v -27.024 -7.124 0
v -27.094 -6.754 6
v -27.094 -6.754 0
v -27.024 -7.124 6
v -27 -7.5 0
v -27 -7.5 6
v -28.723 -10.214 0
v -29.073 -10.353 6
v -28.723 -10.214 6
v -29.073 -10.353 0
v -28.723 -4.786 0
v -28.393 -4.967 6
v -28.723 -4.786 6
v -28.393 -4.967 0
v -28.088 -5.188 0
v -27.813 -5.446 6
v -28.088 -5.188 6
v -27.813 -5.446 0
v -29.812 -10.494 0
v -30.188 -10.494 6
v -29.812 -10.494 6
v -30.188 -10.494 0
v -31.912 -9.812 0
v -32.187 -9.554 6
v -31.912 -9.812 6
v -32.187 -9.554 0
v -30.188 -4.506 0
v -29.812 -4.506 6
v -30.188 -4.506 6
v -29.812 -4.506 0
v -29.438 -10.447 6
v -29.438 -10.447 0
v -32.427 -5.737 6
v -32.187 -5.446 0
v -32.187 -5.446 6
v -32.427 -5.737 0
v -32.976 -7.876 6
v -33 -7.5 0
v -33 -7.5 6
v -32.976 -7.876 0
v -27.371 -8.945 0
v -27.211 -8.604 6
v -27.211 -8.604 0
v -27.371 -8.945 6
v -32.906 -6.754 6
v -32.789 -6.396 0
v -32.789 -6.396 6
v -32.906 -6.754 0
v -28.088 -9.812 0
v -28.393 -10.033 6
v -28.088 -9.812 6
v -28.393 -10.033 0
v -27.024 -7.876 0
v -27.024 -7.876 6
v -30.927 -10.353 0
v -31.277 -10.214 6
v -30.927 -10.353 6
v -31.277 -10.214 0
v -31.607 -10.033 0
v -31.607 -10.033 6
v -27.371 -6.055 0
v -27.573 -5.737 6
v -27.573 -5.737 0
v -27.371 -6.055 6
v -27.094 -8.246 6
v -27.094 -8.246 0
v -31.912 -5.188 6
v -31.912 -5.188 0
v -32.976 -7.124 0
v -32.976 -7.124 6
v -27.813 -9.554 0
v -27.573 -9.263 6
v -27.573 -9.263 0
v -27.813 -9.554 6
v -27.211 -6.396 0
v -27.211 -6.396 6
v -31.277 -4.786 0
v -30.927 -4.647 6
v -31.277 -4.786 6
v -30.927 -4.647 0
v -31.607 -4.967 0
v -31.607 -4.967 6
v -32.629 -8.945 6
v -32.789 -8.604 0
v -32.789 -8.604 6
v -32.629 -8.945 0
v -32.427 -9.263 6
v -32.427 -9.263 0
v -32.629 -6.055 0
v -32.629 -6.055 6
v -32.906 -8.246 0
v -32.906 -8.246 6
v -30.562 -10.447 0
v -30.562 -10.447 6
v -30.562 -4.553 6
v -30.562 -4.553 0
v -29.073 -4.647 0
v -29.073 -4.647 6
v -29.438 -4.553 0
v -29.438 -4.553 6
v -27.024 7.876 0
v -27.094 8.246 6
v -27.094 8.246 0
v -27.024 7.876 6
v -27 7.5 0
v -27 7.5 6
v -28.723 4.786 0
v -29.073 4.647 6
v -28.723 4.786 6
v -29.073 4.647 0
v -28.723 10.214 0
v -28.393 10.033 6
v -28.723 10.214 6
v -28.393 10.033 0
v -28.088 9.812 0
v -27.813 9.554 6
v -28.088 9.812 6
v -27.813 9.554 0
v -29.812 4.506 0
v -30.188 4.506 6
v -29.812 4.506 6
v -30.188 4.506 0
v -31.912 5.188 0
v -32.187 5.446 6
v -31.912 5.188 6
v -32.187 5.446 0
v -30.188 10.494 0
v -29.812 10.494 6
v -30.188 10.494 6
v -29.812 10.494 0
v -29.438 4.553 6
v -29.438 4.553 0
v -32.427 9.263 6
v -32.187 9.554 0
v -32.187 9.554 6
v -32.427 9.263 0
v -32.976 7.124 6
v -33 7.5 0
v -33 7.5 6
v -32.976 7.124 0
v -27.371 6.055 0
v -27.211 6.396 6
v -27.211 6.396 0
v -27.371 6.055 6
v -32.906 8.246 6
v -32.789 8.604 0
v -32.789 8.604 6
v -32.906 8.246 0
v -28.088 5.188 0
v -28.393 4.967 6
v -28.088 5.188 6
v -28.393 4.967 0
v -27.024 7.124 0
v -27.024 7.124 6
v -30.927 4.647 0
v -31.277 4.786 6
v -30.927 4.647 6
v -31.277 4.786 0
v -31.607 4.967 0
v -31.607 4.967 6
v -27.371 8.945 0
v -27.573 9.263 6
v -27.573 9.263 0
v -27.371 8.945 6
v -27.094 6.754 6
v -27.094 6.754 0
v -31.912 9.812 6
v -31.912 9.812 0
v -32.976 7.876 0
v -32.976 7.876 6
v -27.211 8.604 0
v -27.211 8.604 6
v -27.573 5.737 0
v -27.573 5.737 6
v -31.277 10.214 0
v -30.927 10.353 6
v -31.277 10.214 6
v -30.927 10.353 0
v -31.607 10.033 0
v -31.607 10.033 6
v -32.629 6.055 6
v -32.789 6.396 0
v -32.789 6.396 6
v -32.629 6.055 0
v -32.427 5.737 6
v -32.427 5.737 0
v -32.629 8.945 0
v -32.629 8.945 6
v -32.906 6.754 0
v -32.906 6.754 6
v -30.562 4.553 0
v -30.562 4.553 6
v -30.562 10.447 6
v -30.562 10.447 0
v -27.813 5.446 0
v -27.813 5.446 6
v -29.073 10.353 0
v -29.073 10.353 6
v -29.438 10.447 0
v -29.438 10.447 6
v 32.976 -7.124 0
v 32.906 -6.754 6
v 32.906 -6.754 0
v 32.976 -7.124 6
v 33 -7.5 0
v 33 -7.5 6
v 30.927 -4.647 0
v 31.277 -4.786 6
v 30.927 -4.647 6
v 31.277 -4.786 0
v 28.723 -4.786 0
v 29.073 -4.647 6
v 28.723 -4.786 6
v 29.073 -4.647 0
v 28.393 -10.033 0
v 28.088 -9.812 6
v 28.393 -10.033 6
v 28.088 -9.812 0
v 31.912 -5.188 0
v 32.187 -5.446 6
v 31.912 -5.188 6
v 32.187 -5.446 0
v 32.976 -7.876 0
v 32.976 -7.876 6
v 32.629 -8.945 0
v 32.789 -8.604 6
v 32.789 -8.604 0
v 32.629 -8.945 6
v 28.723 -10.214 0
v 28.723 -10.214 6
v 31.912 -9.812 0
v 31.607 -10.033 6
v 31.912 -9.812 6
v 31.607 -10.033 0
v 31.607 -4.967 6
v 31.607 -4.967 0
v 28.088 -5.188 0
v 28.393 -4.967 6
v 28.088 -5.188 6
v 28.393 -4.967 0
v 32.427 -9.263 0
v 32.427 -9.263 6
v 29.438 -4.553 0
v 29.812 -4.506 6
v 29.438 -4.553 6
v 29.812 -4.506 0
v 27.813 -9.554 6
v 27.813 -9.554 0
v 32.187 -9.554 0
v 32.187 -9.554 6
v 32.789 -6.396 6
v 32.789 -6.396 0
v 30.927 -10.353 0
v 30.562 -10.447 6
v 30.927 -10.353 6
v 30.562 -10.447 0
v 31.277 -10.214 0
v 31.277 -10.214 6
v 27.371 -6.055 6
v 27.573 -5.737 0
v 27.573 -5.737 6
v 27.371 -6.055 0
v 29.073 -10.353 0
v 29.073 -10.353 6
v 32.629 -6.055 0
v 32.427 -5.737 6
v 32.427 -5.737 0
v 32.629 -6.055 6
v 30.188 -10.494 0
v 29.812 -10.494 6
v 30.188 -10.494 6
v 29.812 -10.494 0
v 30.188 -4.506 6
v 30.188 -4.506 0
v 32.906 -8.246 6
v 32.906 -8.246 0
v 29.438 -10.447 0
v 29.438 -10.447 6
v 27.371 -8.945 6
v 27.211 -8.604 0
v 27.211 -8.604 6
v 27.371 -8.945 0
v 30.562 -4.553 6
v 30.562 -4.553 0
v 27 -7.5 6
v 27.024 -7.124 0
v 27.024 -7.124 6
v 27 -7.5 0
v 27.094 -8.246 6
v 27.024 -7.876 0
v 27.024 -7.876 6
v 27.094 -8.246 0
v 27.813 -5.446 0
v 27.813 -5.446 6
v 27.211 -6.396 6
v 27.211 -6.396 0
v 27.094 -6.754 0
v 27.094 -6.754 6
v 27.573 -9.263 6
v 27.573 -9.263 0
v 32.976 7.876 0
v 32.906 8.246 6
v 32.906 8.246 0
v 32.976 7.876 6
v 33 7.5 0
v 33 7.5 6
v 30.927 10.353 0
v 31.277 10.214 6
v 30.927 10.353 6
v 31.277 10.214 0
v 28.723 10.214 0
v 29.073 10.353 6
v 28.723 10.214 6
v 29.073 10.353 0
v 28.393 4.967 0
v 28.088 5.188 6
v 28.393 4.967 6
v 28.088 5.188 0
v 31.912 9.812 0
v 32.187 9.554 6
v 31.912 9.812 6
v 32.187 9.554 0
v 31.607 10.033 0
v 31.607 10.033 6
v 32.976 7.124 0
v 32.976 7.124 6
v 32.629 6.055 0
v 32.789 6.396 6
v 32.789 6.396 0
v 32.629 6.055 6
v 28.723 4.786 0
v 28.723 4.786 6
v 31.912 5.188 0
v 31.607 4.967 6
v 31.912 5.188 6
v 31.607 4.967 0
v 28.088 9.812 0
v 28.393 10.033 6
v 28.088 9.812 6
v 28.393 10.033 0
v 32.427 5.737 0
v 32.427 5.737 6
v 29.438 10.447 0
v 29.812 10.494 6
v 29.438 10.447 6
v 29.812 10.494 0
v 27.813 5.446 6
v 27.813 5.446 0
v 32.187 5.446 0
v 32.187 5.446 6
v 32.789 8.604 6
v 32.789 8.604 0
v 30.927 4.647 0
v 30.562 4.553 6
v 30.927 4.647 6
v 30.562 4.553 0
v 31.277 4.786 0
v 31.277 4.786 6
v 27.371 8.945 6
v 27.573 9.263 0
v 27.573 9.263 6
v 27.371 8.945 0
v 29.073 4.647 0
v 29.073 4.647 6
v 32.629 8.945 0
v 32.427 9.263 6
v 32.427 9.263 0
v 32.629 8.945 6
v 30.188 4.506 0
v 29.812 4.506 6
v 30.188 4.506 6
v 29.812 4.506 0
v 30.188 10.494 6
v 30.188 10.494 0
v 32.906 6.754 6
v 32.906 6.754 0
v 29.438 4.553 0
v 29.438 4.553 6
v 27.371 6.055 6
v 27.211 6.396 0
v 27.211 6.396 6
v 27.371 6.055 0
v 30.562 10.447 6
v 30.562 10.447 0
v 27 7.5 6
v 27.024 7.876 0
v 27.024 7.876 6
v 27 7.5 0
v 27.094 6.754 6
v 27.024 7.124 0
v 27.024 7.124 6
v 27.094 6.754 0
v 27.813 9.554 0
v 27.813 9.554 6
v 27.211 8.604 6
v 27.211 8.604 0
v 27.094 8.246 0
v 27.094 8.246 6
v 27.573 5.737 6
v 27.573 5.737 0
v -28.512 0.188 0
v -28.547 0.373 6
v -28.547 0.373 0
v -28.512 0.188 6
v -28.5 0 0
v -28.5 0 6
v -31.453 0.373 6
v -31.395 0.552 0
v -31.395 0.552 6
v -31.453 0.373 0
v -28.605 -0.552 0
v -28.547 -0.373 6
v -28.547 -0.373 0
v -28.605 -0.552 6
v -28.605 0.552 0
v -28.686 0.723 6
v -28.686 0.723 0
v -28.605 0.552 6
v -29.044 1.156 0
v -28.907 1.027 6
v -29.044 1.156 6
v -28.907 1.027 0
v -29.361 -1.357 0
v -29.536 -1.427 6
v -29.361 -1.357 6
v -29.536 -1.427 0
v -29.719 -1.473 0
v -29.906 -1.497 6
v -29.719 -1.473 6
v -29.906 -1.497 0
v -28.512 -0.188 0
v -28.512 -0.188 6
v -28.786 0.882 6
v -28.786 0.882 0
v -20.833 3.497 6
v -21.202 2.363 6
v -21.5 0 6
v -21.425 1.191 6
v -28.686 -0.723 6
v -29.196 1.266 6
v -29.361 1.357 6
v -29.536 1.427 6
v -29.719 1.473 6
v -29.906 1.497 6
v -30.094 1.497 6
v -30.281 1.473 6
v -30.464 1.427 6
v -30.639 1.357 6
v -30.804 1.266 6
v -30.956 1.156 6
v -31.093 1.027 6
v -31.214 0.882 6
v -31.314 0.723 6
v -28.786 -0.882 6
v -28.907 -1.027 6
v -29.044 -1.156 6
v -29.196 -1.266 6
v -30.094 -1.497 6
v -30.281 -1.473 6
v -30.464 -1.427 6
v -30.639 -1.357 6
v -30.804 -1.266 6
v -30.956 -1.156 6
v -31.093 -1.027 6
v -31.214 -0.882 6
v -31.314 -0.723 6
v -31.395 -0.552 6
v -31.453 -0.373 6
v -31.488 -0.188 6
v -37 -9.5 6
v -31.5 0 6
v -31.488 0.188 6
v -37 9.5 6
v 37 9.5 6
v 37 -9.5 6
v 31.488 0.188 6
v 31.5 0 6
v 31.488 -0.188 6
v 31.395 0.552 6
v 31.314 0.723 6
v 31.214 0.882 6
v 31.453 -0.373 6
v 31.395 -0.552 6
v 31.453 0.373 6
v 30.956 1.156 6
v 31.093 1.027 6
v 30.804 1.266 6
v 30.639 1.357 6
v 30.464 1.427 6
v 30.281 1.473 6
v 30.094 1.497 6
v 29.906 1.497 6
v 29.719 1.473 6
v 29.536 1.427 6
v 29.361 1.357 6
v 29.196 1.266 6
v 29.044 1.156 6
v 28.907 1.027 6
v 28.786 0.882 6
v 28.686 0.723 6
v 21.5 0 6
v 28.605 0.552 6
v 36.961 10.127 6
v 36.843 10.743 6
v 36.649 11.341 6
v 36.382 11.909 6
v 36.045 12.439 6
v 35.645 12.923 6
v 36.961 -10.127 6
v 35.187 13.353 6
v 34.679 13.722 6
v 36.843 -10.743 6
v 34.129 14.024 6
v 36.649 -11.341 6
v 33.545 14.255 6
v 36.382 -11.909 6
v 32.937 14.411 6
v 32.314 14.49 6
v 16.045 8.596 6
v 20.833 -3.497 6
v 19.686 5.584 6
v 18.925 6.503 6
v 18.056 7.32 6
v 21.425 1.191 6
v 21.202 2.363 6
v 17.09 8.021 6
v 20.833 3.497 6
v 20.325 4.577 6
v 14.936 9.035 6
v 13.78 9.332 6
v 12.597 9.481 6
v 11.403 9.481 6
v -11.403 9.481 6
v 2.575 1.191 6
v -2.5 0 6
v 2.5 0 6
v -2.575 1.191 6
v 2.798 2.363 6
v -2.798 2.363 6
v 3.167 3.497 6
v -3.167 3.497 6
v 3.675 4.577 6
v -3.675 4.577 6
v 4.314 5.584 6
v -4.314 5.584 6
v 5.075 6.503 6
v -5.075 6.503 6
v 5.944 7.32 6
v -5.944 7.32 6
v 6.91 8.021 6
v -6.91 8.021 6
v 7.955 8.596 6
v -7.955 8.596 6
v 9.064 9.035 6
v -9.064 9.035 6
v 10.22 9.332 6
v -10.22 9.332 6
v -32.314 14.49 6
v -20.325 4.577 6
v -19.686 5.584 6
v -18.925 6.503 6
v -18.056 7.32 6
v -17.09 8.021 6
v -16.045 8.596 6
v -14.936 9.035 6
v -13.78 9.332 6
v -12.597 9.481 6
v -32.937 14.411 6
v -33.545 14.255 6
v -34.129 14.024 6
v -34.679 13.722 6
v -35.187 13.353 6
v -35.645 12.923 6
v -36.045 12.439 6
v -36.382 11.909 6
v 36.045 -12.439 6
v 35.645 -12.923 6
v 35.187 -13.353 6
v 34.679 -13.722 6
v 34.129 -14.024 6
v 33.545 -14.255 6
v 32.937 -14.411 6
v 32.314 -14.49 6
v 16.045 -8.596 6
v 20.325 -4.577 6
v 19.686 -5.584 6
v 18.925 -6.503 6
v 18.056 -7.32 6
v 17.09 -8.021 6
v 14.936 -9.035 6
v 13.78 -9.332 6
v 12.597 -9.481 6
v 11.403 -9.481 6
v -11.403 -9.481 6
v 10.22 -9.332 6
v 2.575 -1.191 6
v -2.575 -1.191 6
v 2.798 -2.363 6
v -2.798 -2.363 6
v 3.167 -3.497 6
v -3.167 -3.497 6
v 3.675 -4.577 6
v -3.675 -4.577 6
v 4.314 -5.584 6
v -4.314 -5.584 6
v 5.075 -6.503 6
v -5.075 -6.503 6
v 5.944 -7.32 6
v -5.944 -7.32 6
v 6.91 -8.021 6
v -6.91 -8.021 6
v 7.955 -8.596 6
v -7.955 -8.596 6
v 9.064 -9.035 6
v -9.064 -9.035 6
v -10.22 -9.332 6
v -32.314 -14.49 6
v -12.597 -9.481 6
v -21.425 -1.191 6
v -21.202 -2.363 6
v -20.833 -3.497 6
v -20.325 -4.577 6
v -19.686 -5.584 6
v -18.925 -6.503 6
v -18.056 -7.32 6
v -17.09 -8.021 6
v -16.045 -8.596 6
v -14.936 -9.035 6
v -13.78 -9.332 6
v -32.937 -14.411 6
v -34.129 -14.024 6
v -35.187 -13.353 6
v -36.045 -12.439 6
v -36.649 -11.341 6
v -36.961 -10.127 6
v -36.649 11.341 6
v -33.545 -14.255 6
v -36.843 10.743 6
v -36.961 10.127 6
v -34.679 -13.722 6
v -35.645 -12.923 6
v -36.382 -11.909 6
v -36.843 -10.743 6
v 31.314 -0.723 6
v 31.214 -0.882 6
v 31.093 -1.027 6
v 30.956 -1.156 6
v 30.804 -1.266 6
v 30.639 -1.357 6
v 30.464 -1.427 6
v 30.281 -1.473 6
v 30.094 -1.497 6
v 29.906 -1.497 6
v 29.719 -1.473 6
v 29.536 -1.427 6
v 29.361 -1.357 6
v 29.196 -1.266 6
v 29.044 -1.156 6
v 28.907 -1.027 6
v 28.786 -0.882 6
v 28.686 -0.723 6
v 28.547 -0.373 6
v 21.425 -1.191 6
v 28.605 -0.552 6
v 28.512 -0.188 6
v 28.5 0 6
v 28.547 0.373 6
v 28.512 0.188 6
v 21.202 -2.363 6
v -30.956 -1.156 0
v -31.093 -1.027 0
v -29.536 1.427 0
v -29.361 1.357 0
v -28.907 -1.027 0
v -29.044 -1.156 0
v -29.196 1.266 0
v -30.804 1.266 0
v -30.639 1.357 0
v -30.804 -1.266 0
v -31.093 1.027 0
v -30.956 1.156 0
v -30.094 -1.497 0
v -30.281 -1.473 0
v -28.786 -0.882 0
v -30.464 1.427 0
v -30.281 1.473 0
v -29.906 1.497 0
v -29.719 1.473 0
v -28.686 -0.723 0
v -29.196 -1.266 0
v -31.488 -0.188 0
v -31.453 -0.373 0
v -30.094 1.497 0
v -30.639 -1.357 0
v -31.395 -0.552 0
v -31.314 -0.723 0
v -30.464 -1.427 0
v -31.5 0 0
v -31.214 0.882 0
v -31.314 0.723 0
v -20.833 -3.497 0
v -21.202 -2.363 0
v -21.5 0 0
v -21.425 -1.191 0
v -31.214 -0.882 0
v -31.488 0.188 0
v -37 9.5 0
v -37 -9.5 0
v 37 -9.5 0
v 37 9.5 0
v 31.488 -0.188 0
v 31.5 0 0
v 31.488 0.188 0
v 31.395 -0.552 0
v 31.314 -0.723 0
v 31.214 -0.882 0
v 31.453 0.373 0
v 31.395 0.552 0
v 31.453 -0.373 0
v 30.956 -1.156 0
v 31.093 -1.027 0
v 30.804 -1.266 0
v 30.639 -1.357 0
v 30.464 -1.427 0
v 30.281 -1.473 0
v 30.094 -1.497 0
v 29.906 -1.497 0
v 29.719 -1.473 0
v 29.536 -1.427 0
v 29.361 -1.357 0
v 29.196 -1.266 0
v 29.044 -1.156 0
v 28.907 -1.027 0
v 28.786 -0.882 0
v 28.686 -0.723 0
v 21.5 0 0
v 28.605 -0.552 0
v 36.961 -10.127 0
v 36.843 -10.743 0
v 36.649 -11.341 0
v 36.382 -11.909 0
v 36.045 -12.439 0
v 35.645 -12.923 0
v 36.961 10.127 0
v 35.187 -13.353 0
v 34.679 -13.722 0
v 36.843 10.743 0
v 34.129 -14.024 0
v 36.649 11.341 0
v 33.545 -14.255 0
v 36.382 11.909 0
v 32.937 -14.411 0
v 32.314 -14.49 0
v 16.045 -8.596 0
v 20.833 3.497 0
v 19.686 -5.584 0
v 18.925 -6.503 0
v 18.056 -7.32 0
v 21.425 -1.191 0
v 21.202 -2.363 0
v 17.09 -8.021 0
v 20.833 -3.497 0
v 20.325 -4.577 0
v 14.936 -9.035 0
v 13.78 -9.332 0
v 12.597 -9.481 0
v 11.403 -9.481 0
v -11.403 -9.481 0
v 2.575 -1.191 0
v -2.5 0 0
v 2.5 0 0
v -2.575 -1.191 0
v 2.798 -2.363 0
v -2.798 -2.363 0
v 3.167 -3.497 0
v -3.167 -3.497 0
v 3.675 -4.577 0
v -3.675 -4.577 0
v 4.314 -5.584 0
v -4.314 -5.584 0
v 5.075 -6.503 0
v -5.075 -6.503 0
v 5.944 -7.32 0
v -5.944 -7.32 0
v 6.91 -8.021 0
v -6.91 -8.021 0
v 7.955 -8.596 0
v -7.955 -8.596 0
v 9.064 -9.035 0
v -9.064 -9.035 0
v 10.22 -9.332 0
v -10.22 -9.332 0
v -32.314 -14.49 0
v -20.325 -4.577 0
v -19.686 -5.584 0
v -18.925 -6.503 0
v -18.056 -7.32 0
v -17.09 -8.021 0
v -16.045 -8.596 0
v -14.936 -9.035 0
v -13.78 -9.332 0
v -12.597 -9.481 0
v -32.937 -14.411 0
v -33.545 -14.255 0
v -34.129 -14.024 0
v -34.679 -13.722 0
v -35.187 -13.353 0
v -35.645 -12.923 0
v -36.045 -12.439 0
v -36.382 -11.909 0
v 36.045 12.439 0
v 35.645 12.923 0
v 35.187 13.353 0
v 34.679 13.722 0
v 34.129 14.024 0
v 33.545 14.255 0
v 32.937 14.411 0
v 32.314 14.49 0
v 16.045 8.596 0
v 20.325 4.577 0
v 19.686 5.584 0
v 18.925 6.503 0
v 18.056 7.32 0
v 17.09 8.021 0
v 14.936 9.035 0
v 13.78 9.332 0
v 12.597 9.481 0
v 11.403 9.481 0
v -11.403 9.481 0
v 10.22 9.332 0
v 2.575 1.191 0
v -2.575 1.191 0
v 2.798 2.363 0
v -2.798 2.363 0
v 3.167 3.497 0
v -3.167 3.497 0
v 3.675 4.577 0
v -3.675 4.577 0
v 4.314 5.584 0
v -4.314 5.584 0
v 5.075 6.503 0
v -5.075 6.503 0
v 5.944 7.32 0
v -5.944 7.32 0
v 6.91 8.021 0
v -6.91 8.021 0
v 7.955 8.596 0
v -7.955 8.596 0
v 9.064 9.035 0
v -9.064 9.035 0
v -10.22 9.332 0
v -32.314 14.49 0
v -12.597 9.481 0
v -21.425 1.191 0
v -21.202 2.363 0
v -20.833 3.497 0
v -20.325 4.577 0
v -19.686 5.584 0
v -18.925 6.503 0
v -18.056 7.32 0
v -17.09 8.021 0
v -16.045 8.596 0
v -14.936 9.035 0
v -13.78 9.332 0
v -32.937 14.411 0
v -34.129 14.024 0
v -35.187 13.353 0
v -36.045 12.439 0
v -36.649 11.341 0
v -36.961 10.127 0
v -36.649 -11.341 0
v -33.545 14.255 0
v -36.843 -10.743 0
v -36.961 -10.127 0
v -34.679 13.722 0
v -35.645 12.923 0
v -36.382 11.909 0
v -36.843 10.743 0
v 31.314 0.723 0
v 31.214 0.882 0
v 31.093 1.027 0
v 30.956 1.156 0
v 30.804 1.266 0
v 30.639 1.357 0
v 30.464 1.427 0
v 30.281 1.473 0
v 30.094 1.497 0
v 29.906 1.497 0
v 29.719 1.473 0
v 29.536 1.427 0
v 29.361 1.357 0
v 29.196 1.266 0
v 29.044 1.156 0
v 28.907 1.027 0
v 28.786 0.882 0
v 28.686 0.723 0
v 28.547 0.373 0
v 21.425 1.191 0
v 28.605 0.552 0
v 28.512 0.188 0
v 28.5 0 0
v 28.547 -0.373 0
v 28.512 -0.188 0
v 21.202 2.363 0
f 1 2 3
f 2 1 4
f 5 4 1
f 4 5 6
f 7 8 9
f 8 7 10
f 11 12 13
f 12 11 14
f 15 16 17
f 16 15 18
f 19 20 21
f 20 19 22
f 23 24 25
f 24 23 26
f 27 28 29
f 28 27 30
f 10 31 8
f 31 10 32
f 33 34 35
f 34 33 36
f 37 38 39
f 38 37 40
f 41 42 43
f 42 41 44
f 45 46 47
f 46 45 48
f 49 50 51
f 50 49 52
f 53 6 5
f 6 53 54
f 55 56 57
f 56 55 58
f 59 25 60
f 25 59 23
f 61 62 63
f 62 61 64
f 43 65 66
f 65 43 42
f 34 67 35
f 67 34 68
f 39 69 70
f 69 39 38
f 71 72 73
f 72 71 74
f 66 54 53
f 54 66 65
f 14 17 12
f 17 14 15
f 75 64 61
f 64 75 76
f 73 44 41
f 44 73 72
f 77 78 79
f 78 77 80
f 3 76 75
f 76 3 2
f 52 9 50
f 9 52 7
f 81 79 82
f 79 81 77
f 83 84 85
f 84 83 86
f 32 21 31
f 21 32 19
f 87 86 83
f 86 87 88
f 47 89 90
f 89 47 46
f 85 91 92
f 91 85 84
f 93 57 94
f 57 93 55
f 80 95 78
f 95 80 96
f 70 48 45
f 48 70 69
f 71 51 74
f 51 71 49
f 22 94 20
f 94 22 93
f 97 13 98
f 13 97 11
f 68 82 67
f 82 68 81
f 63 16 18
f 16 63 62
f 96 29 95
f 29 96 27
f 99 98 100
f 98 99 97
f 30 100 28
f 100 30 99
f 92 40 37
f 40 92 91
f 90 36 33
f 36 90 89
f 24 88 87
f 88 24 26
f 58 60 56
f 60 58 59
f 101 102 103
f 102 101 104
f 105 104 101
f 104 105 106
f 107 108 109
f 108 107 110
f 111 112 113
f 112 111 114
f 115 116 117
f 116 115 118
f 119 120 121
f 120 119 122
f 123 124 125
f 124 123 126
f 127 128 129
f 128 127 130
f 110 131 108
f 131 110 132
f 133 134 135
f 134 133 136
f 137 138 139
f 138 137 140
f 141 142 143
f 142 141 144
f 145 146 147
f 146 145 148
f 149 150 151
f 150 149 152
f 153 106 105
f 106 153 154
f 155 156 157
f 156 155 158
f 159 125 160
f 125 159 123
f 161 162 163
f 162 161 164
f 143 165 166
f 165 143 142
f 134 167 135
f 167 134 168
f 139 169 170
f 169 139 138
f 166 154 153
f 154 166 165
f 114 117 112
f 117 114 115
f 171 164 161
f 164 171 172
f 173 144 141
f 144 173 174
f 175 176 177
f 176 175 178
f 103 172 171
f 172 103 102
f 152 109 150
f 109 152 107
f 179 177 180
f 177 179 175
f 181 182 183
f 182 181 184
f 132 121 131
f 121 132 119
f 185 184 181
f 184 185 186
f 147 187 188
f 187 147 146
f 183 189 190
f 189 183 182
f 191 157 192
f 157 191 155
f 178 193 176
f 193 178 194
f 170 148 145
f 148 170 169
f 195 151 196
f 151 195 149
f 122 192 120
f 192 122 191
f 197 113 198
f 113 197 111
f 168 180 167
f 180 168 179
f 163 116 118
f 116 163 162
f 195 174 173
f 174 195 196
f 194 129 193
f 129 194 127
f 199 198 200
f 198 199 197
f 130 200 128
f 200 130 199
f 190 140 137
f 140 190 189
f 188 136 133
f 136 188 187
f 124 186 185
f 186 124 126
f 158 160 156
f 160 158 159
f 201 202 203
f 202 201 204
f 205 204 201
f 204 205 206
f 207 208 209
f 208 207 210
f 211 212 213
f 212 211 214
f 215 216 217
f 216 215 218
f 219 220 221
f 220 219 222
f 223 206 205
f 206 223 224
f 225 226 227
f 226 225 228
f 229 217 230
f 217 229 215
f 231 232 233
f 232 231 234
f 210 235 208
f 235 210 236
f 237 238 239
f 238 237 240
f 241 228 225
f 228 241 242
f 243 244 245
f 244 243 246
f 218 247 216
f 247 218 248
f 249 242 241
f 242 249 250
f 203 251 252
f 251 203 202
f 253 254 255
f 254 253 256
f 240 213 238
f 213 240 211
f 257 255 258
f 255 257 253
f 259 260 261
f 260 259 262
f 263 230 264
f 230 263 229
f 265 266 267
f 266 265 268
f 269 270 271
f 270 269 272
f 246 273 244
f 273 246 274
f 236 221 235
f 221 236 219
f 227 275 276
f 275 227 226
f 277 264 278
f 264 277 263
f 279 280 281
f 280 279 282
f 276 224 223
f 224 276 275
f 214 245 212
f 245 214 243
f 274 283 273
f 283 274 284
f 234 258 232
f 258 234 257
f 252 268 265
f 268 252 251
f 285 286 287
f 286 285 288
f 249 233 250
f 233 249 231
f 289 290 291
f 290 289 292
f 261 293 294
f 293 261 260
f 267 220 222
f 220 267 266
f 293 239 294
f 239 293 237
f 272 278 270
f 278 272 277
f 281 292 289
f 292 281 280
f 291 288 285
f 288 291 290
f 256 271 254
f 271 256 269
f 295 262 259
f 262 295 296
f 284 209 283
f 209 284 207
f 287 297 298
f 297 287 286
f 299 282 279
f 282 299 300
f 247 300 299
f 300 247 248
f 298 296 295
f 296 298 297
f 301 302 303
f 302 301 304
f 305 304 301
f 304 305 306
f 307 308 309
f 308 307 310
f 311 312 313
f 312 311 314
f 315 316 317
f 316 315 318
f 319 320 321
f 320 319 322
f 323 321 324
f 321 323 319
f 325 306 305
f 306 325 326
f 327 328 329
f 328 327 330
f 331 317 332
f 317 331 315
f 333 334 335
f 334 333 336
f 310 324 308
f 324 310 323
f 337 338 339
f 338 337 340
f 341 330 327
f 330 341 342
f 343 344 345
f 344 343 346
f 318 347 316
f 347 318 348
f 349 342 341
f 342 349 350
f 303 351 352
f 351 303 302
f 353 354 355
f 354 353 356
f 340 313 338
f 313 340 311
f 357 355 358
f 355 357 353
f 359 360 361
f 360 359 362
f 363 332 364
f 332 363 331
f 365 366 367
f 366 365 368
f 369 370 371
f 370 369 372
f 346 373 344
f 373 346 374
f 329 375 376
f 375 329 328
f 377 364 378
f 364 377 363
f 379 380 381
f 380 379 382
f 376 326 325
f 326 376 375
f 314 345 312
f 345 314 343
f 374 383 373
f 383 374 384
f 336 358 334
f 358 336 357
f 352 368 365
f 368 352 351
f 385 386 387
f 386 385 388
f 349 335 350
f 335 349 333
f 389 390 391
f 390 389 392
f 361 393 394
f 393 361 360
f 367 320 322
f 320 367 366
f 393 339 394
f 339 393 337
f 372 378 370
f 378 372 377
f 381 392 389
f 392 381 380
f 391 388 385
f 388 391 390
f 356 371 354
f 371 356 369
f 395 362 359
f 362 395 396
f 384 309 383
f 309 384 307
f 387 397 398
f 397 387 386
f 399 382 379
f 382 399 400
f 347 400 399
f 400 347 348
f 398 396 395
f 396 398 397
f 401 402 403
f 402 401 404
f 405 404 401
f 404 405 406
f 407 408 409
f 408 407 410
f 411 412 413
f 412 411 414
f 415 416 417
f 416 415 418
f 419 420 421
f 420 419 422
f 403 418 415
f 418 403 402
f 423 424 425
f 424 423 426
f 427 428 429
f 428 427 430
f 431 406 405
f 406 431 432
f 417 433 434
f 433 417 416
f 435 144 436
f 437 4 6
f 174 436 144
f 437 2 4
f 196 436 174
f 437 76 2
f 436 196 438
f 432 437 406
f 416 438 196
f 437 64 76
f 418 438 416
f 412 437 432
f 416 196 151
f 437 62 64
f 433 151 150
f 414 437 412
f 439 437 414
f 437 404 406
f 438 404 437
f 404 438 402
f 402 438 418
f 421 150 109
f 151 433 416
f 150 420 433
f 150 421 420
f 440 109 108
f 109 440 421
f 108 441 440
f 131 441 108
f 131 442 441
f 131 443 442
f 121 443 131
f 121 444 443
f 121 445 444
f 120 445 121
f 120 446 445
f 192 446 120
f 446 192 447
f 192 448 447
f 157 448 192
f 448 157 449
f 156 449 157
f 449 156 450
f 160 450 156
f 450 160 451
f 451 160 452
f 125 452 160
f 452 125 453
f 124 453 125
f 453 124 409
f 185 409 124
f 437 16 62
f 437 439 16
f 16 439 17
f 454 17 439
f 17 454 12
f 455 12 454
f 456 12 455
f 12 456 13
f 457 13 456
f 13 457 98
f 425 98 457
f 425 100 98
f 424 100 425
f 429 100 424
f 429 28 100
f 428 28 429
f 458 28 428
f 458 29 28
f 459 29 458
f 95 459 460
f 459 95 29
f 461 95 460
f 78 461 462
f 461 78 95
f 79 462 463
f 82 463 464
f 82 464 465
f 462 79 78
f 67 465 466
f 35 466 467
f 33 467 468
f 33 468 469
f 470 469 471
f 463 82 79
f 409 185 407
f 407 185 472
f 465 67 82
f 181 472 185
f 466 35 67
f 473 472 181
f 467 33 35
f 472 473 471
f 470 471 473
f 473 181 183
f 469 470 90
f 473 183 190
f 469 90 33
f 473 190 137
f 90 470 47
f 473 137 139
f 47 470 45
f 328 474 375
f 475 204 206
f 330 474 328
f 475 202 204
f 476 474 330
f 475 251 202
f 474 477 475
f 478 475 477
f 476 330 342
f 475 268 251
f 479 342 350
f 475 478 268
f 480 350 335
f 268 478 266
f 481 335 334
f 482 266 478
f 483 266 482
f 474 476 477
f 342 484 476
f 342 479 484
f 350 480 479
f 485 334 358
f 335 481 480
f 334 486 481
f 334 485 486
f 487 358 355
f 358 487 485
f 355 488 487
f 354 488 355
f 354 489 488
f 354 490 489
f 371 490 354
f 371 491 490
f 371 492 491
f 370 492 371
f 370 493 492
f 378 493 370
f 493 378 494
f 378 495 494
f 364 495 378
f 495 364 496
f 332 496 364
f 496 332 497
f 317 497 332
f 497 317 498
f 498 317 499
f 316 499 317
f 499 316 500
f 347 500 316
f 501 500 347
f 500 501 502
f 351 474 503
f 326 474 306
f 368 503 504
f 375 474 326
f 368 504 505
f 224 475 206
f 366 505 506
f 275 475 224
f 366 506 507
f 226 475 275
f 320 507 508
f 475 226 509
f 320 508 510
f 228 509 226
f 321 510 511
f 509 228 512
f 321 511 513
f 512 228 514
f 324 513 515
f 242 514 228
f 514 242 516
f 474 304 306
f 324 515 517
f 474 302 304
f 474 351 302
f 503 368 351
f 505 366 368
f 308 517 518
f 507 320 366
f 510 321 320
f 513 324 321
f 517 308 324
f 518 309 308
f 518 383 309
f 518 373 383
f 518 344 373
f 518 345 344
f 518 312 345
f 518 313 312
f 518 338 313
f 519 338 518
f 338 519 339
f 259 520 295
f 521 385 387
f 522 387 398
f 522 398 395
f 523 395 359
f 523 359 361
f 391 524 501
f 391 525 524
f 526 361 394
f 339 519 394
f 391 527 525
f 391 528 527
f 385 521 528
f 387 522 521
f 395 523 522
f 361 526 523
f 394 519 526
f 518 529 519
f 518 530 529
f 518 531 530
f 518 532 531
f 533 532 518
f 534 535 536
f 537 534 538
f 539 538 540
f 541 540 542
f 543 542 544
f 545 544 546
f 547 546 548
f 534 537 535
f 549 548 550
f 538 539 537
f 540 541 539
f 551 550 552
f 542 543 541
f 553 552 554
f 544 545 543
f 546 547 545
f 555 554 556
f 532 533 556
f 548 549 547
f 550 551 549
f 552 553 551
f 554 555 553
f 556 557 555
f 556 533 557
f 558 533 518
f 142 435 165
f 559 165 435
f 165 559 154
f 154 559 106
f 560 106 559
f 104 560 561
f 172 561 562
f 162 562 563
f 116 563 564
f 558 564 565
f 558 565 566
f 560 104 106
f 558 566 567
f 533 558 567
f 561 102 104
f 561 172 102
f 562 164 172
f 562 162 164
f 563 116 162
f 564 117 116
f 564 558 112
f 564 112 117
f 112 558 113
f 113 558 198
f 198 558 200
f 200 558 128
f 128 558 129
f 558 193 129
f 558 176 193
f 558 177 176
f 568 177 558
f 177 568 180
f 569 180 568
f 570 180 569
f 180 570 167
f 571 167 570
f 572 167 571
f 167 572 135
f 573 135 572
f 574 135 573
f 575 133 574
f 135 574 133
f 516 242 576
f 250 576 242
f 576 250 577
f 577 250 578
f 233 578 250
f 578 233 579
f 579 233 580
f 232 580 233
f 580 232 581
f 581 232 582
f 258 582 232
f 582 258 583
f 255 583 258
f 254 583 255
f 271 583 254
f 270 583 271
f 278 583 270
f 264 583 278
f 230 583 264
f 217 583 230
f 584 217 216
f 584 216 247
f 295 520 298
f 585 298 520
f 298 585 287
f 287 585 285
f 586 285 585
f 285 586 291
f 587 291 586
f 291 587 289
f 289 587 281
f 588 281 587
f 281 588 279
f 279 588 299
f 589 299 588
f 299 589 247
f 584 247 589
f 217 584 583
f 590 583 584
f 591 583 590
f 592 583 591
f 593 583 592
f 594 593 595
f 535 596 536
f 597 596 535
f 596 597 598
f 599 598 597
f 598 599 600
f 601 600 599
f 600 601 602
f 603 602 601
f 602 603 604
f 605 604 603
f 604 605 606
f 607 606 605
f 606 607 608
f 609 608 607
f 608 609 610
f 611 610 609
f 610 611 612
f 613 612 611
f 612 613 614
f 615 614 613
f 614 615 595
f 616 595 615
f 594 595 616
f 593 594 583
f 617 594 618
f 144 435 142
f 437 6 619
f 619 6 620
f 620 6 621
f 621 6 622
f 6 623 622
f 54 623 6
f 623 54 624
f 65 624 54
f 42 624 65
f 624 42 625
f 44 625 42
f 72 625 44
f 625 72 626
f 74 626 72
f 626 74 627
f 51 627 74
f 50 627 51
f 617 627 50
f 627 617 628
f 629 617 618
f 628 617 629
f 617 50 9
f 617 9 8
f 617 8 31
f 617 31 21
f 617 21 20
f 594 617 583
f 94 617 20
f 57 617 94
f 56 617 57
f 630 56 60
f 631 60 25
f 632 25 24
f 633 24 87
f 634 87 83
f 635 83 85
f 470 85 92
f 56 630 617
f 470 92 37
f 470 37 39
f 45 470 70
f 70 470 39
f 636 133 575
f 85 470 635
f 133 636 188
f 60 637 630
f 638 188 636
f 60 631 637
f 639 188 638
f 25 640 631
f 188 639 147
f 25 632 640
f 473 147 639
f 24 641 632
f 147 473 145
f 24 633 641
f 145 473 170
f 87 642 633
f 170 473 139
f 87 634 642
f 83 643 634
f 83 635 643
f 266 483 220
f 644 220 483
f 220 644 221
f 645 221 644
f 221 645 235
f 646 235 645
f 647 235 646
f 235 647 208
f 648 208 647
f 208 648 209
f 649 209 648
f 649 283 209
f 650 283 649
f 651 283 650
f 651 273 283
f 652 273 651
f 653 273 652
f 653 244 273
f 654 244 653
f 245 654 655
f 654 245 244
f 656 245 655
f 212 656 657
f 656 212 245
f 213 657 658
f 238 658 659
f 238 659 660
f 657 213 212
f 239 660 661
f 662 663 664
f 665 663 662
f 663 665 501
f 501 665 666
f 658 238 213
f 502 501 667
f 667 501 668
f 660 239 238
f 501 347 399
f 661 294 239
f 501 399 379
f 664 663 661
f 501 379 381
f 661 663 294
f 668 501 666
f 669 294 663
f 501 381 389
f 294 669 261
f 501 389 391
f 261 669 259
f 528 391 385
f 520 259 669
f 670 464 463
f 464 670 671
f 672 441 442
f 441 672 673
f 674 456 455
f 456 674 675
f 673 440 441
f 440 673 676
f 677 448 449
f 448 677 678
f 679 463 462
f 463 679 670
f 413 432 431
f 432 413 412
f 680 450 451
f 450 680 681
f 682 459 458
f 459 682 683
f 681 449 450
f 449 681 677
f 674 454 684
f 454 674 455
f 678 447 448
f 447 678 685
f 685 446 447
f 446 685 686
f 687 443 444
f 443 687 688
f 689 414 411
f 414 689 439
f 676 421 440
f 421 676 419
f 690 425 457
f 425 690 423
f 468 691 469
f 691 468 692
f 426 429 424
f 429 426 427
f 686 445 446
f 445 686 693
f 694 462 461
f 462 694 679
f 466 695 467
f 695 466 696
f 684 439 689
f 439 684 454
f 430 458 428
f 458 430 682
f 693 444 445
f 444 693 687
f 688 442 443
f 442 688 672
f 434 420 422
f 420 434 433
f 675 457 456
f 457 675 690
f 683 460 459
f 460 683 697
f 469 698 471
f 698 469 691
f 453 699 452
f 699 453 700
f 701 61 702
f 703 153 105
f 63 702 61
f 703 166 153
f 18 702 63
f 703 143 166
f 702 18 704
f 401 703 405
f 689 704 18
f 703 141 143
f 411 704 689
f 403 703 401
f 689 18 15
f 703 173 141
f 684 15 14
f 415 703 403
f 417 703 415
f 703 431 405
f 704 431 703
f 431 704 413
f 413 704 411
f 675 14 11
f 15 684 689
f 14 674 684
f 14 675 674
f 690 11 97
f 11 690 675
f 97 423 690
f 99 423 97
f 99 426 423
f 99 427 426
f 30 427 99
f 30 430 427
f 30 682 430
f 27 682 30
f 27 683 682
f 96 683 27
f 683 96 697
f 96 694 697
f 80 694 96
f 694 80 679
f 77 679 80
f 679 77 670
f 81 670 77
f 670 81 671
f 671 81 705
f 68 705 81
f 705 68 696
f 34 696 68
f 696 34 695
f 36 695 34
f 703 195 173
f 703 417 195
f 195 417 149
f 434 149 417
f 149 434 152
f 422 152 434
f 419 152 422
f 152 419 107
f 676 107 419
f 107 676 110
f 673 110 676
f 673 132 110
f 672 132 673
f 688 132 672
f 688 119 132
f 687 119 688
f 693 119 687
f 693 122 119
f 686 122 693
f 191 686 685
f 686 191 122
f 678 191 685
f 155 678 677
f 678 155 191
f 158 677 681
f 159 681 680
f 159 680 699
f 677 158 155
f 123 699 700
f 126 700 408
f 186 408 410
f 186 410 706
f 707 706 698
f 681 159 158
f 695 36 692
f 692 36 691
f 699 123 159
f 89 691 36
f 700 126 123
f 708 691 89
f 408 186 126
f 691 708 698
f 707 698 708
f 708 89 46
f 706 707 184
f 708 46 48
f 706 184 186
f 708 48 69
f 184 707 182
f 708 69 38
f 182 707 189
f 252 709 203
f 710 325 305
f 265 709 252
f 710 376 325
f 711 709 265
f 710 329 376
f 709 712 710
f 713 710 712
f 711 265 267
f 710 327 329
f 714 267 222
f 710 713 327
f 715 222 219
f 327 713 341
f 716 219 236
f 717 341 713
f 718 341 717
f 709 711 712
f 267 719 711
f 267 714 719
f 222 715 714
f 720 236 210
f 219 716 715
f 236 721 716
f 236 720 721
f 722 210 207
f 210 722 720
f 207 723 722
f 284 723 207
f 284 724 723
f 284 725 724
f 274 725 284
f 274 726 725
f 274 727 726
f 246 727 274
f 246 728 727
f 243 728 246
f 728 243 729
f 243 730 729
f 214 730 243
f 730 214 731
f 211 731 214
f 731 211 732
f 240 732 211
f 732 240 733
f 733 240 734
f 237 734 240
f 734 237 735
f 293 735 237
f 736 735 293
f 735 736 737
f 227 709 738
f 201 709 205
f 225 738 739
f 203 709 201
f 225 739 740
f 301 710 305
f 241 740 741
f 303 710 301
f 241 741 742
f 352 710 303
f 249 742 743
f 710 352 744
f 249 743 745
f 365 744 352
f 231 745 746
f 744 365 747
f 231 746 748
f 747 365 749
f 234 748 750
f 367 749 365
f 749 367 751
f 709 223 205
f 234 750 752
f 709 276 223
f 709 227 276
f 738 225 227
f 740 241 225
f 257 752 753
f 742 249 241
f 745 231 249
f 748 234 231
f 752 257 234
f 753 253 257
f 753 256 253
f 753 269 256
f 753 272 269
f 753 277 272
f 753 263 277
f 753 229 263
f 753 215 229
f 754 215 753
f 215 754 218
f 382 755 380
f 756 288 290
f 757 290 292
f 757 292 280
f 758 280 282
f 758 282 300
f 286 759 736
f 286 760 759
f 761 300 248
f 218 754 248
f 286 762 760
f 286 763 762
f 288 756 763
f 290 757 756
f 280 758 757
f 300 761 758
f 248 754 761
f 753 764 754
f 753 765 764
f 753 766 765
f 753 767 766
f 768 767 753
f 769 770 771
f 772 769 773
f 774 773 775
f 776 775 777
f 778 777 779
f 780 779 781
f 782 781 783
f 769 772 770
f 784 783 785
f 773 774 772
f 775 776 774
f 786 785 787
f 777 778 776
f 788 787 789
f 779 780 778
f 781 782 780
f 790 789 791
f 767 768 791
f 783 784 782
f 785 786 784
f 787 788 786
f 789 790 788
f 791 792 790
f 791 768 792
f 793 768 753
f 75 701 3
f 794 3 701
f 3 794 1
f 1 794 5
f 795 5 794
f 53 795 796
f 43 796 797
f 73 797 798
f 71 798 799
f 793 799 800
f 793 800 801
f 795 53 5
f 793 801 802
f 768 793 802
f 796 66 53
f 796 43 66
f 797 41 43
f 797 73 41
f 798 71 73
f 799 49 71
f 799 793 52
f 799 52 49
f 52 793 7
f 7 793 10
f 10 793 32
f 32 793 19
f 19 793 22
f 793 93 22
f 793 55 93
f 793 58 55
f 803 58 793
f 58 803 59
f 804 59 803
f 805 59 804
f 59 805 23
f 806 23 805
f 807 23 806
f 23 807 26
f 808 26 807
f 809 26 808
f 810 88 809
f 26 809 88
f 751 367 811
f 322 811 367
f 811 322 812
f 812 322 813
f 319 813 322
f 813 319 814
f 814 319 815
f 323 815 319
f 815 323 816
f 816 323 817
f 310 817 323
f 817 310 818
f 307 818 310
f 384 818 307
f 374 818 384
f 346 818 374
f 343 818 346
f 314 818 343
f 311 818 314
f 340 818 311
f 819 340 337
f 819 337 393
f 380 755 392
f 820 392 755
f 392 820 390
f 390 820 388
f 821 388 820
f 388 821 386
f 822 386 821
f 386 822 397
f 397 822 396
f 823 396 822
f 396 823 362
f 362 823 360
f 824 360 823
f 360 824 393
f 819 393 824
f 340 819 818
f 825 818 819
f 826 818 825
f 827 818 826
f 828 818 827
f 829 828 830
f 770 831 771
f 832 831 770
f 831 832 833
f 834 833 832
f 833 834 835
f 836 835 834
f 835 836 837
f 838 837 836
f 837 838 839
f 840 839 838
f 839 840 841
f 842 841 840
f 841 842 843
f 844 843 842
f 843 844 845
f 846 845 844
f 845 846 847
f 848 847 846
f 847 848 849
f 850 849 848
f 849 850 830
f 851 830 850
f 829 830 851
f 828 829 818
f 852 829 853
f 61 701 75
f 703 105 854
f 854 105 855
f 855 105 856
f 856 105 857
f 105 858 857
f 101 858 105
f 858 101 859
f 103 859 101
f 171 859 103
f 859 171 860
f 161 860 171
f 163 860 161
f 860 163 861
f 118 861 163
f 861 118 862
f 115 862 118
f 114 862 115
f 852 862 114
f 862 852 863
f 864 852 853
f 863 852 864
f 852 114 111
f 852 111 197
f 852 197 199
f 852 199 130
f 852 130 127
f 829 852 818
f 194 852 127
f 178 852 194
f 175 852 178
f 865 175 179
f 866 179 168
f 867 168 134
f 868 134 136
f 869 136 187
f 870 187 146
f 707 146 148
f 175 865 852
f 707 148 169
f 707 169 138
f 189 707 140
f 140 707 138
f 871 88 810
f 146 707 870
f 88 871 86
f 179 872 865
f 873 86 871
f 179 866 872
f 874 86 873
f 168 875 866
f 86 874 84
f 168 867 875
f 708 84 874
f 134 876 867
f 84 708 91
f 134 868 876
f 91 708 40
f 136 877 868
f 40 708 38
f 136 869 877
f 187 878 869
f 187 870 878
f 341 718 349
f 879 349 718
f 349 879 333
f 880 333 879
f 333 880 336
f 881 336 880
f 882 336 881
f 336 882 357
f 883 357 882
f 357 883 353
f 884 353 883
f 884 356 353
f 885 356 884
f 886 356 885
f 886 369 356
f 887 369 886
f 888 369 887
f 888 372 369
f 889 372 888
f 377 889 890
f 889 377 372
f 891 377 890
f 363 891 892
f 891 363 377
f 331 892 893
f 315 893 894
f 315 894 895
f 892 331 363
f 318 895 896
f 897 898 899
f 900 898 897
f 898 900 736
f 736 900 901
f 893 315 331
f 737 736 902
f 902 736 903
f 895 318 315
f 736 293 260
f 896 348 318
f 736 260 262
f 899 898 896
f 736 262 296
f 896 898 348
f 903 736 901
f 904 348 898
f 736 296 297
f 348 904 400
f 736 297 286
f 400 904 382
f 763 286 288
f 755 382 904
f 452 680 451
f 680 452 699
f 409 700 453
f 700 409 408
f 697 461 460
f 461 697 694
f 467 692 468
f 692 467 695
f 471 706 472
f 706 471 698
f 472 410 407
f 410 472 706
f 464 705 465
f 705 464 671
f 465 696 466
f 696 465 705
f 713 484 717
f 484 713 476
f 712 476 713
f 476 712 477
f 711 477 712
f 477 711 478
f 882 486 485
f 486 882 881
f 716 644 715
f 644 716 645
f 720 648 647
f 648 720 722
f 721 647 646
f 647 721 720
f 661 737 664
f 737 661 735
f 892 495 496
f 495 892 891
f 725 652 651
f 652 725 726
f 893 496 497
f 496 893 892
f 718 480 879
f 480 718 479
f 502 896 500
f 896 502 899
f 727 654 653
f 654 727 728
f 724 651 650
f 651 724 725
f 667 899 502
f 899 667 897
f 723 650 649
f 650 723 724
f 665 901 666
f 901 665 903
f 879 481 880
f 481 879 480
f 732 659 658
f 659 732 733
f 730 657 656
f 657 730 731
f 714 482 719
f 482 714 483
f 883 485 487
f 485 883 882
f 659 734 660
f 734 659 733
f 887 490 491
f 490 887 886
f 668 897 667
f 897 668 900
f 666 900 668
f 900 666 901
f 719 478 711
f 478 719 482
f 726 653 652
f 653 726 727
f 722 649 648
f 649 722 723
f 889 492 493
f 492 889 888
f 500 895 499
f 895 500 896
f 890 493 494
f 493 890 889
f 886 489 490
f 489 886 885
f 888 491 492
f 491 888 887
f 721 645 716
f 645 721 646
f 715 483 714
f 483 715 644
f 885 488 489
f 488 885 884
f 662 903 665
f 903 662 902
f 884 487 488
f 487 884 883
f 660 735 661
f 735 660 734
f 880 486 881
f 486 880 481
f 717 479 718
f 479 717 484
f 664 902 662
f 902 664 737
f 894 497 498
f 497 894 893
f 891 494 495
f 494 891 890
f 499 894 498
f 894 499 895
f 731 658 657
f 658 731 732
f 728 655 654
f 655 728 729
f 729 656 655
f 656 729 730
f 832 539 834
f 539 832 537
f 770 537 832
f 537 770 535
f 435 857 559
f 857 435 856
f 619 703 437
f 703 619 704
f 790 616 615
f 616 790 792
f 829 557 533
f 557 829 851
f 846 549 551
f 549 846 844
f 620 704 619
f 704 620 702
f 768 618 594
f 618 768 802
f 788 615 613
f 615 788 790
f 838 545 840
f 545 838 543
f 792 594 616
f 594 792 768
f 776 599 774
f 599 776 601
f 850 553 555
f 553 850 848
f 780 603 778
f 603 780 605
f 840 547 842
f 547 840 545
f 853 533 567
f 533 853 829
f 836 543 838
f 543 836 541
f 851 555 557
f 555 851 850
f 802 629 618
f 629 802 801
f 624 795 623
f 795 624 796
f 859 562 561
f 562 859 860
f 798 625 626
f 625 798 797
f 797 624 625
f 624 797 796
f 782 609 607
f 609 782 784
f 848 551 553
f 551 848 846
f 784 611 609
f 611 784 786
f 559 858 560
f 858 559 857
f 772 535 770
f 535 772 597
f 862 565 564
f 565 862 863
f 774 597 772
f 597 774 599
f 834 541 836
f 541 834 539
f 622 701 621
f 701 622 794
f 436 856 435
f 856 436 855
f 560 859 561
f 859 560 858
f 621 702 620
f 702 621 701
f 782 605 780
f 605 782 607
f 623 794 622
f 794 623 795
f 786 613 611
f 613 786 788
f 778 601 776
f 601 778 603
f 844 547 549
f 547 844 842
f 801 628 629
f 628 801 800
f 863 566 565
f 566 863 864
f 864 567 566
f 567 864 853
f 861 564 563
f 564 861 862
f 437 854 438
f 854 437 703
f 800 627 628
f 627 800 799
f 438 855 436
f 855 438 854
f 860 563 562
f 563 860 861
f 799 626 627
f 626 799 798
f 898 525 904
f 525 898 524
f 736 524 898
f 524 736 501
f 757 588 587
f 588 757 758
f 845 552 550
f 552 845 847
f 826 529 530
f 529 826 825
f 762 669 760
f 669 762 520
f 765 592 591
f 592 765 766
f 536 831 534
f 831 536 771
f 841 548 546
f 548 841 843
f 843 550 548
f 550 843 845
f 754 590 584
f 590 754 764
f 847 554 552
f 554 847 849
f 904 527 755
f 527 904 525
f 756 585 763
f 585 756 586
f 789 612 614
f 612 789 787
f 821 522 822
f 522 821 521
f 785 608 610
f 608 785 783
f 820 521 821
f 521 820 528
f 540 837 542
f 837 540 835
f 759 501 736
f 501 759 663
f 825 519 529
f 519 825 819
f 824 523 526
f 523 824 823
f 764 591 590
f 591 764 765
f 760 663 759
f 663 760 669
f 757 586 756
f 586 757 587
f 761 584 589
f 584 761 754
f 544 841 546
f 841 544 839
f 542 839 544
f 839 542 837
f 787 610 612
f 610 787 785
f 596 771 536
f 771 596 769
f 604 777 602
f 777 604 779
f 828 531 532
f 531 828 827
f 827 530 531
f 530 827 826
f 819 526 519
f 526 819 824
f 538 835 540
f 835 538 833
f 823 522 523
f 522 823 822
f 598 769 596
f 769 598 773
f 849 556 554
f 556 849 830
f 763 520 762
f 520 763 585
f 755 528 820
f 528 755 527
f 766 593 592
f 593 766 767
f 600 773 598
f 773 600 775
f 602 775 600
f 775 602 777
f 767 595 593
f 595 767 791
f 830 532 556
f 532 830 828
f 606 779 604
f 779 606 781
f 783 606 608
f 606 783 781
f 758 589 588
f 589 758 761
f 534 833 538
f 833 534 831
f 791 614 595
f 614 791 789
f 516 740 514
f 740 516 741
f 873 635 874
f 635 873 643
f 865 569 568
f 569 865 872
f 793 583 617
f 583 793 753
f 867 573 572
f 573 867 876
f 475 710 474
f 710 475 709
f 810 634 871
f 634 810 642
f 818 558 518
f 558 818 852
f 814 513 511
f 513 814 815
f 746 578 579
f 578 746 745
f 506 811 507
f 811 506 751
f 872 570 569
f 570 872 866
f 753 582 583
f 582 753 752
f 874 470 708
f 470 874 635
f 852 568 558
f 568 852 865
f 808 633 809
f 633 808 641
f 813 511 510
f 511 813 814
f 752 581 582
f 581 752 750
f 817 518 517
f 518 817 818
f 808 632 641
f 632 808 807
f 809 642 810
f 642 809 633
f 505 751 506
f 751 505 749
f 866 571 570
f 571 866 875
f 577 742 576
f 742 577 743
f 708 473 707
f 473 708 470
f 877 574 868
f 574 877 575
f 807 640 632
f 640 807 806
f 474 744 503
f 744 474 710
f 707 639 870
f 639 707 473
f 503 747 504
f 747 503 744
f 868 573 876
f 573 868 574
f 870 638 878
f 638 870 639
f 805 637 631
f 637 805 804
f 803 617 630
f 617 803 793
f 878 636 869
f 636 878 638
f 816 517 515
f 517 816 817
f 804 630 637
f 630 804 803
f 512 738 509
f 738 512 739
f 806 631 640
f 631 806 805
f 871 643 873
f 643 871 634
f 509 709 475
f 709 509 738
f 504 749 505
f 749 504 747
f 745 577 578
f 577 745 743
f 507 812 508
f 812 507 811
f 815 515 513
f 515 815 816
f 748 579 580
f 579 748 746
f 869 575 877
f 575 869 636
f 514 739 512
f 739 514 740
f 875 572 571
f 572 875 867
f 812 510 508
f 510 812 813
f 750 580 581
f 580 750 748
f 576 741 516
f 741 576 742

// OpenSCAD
$fn = 50;


difference() {
	union() {
		hull() {
			translate(v = [-32.0000000000, 9.5000000000, 0]) {
				cylinder(h = 6, r = 5);
			}
			translate(v = [32.0000000000, 9.5000000000, 0]) {
				cylinder(h = 6, r = 5);
			}
			translate(v = [-32.0000000000, -9.5000000000, 0]) {
				cylinder(h = 6, r = 5);
			}
			translate(v = [32.0000000000, -9.5000000000, 0]) {
				cylinder(h = 6, r = 5);
			}
		}
	}
	union() {
		#translate(v = [-30.0000000000, -7.5000000000, 0]) {
			cylinder(h = 6, r = 3.0000000000);
		}
		#translate(v = [-30.0000000000, 7.5000000000, 0]) {
			cylinder(h = 6, r = 3.0000000000);
		}
		#translate(v = [30.0000000000, -7.5000000000, 0]) {
			cylinder(h = 6, r = 3.0000000000);
		}
		#translate(v = [30.0000000000, 7.5000000000, 0]) {
			cylinder(h = 6, r = 3.0000000000);
		}
		#translate(v = [-30.0000000000, -7.5000000000, -100.0000000000]) {
			cylinder(h = 200, r = 3.0000000000);
		}
		#translate(v = [-30.0000000000, 7.5000000000, -100.0000000000]) {
			cylinder(h = 200, r = 3.0000000000);
		}
		#translate(v = [30.0000000000, -7.5000000000, -100.0000000000]) {
			cylinder(h = 200, r = 3.0000000000);
		}
		#translate(v = [30.0000000000, 7.5000000000, -100.0000000000]) {
			cylinder(h = 200, r = 3.0000000000);
		}
		#translate(v = [-30.0000000000, -7.5000000000, 0]) {
			cylinder(h = 6, r = 1.5000000000);
		}
		#translate(v = [-30.0000000000, 0.0000000000, 0]) {
			cylinder(h = 6, r = 1.5000000000);
		}
		#translate(v = [-30.0000000000, 7.5000000000, 0]) {
			cylinder(h = 6, r = 1.5000000000);
		}
		#translate(v = [30.0000000000, -7.5000000000, 0]) {
			cylinder(h = 6, r = 1.5000000000);
		}
		#translate(v = [30.0000000000, 0.0000000000, 0]) {
			cylinder(h = 6, r = 1.5000000000);
		}
		#translate(v = [30.0000000000, 7.5000000000, 0]) {
			cylinder(h = 6, r = 1.5000000000);
		}
		#translate(v = [-30.0000000000, -7.5000000000, 0]) {
			cylinder(h = 6, r = 1.5000000000);
		}
		#translate(v = [-30.0000000000, 0.0000000000, 0]) {
			cylinder(h = 6, r = 1.5000000000);
		}
		#translate(v = [-30.0000000000, 7.5000000000, 0]) {
			cylinder(h = 6, r = 1.5000000000);
		}
		#translate(v = [30.0000000000, -7.5000000000, 0]) {
			cylinder(h = 6, r = 1.5000000000);
		}
		#translate(v = [30.0000000000, 0.0000000000, 0]) {
			cylinder(h = 6, r = 1.5000000000);
		}
		#translate(v = [30.0000000000, 7.5000000000, 0]) {
			cylinder(h = 6, r = 1.5000000000);
		}
		#translate(v = [-30.0000000000, -7.5000000000, 0]) {
			cylinder(h = 6, r = 1.5000000000);
		}
		#translate(v = [-30.0000000000, 0.0000000000, 0]) {
			cylinder(h = 6, r = 1.5000000000);
		}
		#translate(v = [-30.0000000000, 7.5000000000, 0]) {
			cylinder(h = 6, r = 1.5000000000);
		}
		#translate(v = [30.0000000000, -7.5000000000, 0]) {
			cylinder(h = 6, r = 1.5000000000);
		}
		#translate(v = [30.0000000000, 0.0000000000, 0]) {
			cylinder(h = 6, r = 1.5000000000);
		}
		#translate(v = [30.0000000000, 7.5000000000, 0]) {
			cylinder(h = 6, r = 1.5000000000);
		}
		#translate(v = [-12.0000000000, 0, 0]) {
			cylinder(h = 6, r = 9.5000000000);
		}
		#translate(v = [12.0000000000, 0, 0]) {
			cylinder(h = 6, r = 9.5000000000);
		}
	}
}
